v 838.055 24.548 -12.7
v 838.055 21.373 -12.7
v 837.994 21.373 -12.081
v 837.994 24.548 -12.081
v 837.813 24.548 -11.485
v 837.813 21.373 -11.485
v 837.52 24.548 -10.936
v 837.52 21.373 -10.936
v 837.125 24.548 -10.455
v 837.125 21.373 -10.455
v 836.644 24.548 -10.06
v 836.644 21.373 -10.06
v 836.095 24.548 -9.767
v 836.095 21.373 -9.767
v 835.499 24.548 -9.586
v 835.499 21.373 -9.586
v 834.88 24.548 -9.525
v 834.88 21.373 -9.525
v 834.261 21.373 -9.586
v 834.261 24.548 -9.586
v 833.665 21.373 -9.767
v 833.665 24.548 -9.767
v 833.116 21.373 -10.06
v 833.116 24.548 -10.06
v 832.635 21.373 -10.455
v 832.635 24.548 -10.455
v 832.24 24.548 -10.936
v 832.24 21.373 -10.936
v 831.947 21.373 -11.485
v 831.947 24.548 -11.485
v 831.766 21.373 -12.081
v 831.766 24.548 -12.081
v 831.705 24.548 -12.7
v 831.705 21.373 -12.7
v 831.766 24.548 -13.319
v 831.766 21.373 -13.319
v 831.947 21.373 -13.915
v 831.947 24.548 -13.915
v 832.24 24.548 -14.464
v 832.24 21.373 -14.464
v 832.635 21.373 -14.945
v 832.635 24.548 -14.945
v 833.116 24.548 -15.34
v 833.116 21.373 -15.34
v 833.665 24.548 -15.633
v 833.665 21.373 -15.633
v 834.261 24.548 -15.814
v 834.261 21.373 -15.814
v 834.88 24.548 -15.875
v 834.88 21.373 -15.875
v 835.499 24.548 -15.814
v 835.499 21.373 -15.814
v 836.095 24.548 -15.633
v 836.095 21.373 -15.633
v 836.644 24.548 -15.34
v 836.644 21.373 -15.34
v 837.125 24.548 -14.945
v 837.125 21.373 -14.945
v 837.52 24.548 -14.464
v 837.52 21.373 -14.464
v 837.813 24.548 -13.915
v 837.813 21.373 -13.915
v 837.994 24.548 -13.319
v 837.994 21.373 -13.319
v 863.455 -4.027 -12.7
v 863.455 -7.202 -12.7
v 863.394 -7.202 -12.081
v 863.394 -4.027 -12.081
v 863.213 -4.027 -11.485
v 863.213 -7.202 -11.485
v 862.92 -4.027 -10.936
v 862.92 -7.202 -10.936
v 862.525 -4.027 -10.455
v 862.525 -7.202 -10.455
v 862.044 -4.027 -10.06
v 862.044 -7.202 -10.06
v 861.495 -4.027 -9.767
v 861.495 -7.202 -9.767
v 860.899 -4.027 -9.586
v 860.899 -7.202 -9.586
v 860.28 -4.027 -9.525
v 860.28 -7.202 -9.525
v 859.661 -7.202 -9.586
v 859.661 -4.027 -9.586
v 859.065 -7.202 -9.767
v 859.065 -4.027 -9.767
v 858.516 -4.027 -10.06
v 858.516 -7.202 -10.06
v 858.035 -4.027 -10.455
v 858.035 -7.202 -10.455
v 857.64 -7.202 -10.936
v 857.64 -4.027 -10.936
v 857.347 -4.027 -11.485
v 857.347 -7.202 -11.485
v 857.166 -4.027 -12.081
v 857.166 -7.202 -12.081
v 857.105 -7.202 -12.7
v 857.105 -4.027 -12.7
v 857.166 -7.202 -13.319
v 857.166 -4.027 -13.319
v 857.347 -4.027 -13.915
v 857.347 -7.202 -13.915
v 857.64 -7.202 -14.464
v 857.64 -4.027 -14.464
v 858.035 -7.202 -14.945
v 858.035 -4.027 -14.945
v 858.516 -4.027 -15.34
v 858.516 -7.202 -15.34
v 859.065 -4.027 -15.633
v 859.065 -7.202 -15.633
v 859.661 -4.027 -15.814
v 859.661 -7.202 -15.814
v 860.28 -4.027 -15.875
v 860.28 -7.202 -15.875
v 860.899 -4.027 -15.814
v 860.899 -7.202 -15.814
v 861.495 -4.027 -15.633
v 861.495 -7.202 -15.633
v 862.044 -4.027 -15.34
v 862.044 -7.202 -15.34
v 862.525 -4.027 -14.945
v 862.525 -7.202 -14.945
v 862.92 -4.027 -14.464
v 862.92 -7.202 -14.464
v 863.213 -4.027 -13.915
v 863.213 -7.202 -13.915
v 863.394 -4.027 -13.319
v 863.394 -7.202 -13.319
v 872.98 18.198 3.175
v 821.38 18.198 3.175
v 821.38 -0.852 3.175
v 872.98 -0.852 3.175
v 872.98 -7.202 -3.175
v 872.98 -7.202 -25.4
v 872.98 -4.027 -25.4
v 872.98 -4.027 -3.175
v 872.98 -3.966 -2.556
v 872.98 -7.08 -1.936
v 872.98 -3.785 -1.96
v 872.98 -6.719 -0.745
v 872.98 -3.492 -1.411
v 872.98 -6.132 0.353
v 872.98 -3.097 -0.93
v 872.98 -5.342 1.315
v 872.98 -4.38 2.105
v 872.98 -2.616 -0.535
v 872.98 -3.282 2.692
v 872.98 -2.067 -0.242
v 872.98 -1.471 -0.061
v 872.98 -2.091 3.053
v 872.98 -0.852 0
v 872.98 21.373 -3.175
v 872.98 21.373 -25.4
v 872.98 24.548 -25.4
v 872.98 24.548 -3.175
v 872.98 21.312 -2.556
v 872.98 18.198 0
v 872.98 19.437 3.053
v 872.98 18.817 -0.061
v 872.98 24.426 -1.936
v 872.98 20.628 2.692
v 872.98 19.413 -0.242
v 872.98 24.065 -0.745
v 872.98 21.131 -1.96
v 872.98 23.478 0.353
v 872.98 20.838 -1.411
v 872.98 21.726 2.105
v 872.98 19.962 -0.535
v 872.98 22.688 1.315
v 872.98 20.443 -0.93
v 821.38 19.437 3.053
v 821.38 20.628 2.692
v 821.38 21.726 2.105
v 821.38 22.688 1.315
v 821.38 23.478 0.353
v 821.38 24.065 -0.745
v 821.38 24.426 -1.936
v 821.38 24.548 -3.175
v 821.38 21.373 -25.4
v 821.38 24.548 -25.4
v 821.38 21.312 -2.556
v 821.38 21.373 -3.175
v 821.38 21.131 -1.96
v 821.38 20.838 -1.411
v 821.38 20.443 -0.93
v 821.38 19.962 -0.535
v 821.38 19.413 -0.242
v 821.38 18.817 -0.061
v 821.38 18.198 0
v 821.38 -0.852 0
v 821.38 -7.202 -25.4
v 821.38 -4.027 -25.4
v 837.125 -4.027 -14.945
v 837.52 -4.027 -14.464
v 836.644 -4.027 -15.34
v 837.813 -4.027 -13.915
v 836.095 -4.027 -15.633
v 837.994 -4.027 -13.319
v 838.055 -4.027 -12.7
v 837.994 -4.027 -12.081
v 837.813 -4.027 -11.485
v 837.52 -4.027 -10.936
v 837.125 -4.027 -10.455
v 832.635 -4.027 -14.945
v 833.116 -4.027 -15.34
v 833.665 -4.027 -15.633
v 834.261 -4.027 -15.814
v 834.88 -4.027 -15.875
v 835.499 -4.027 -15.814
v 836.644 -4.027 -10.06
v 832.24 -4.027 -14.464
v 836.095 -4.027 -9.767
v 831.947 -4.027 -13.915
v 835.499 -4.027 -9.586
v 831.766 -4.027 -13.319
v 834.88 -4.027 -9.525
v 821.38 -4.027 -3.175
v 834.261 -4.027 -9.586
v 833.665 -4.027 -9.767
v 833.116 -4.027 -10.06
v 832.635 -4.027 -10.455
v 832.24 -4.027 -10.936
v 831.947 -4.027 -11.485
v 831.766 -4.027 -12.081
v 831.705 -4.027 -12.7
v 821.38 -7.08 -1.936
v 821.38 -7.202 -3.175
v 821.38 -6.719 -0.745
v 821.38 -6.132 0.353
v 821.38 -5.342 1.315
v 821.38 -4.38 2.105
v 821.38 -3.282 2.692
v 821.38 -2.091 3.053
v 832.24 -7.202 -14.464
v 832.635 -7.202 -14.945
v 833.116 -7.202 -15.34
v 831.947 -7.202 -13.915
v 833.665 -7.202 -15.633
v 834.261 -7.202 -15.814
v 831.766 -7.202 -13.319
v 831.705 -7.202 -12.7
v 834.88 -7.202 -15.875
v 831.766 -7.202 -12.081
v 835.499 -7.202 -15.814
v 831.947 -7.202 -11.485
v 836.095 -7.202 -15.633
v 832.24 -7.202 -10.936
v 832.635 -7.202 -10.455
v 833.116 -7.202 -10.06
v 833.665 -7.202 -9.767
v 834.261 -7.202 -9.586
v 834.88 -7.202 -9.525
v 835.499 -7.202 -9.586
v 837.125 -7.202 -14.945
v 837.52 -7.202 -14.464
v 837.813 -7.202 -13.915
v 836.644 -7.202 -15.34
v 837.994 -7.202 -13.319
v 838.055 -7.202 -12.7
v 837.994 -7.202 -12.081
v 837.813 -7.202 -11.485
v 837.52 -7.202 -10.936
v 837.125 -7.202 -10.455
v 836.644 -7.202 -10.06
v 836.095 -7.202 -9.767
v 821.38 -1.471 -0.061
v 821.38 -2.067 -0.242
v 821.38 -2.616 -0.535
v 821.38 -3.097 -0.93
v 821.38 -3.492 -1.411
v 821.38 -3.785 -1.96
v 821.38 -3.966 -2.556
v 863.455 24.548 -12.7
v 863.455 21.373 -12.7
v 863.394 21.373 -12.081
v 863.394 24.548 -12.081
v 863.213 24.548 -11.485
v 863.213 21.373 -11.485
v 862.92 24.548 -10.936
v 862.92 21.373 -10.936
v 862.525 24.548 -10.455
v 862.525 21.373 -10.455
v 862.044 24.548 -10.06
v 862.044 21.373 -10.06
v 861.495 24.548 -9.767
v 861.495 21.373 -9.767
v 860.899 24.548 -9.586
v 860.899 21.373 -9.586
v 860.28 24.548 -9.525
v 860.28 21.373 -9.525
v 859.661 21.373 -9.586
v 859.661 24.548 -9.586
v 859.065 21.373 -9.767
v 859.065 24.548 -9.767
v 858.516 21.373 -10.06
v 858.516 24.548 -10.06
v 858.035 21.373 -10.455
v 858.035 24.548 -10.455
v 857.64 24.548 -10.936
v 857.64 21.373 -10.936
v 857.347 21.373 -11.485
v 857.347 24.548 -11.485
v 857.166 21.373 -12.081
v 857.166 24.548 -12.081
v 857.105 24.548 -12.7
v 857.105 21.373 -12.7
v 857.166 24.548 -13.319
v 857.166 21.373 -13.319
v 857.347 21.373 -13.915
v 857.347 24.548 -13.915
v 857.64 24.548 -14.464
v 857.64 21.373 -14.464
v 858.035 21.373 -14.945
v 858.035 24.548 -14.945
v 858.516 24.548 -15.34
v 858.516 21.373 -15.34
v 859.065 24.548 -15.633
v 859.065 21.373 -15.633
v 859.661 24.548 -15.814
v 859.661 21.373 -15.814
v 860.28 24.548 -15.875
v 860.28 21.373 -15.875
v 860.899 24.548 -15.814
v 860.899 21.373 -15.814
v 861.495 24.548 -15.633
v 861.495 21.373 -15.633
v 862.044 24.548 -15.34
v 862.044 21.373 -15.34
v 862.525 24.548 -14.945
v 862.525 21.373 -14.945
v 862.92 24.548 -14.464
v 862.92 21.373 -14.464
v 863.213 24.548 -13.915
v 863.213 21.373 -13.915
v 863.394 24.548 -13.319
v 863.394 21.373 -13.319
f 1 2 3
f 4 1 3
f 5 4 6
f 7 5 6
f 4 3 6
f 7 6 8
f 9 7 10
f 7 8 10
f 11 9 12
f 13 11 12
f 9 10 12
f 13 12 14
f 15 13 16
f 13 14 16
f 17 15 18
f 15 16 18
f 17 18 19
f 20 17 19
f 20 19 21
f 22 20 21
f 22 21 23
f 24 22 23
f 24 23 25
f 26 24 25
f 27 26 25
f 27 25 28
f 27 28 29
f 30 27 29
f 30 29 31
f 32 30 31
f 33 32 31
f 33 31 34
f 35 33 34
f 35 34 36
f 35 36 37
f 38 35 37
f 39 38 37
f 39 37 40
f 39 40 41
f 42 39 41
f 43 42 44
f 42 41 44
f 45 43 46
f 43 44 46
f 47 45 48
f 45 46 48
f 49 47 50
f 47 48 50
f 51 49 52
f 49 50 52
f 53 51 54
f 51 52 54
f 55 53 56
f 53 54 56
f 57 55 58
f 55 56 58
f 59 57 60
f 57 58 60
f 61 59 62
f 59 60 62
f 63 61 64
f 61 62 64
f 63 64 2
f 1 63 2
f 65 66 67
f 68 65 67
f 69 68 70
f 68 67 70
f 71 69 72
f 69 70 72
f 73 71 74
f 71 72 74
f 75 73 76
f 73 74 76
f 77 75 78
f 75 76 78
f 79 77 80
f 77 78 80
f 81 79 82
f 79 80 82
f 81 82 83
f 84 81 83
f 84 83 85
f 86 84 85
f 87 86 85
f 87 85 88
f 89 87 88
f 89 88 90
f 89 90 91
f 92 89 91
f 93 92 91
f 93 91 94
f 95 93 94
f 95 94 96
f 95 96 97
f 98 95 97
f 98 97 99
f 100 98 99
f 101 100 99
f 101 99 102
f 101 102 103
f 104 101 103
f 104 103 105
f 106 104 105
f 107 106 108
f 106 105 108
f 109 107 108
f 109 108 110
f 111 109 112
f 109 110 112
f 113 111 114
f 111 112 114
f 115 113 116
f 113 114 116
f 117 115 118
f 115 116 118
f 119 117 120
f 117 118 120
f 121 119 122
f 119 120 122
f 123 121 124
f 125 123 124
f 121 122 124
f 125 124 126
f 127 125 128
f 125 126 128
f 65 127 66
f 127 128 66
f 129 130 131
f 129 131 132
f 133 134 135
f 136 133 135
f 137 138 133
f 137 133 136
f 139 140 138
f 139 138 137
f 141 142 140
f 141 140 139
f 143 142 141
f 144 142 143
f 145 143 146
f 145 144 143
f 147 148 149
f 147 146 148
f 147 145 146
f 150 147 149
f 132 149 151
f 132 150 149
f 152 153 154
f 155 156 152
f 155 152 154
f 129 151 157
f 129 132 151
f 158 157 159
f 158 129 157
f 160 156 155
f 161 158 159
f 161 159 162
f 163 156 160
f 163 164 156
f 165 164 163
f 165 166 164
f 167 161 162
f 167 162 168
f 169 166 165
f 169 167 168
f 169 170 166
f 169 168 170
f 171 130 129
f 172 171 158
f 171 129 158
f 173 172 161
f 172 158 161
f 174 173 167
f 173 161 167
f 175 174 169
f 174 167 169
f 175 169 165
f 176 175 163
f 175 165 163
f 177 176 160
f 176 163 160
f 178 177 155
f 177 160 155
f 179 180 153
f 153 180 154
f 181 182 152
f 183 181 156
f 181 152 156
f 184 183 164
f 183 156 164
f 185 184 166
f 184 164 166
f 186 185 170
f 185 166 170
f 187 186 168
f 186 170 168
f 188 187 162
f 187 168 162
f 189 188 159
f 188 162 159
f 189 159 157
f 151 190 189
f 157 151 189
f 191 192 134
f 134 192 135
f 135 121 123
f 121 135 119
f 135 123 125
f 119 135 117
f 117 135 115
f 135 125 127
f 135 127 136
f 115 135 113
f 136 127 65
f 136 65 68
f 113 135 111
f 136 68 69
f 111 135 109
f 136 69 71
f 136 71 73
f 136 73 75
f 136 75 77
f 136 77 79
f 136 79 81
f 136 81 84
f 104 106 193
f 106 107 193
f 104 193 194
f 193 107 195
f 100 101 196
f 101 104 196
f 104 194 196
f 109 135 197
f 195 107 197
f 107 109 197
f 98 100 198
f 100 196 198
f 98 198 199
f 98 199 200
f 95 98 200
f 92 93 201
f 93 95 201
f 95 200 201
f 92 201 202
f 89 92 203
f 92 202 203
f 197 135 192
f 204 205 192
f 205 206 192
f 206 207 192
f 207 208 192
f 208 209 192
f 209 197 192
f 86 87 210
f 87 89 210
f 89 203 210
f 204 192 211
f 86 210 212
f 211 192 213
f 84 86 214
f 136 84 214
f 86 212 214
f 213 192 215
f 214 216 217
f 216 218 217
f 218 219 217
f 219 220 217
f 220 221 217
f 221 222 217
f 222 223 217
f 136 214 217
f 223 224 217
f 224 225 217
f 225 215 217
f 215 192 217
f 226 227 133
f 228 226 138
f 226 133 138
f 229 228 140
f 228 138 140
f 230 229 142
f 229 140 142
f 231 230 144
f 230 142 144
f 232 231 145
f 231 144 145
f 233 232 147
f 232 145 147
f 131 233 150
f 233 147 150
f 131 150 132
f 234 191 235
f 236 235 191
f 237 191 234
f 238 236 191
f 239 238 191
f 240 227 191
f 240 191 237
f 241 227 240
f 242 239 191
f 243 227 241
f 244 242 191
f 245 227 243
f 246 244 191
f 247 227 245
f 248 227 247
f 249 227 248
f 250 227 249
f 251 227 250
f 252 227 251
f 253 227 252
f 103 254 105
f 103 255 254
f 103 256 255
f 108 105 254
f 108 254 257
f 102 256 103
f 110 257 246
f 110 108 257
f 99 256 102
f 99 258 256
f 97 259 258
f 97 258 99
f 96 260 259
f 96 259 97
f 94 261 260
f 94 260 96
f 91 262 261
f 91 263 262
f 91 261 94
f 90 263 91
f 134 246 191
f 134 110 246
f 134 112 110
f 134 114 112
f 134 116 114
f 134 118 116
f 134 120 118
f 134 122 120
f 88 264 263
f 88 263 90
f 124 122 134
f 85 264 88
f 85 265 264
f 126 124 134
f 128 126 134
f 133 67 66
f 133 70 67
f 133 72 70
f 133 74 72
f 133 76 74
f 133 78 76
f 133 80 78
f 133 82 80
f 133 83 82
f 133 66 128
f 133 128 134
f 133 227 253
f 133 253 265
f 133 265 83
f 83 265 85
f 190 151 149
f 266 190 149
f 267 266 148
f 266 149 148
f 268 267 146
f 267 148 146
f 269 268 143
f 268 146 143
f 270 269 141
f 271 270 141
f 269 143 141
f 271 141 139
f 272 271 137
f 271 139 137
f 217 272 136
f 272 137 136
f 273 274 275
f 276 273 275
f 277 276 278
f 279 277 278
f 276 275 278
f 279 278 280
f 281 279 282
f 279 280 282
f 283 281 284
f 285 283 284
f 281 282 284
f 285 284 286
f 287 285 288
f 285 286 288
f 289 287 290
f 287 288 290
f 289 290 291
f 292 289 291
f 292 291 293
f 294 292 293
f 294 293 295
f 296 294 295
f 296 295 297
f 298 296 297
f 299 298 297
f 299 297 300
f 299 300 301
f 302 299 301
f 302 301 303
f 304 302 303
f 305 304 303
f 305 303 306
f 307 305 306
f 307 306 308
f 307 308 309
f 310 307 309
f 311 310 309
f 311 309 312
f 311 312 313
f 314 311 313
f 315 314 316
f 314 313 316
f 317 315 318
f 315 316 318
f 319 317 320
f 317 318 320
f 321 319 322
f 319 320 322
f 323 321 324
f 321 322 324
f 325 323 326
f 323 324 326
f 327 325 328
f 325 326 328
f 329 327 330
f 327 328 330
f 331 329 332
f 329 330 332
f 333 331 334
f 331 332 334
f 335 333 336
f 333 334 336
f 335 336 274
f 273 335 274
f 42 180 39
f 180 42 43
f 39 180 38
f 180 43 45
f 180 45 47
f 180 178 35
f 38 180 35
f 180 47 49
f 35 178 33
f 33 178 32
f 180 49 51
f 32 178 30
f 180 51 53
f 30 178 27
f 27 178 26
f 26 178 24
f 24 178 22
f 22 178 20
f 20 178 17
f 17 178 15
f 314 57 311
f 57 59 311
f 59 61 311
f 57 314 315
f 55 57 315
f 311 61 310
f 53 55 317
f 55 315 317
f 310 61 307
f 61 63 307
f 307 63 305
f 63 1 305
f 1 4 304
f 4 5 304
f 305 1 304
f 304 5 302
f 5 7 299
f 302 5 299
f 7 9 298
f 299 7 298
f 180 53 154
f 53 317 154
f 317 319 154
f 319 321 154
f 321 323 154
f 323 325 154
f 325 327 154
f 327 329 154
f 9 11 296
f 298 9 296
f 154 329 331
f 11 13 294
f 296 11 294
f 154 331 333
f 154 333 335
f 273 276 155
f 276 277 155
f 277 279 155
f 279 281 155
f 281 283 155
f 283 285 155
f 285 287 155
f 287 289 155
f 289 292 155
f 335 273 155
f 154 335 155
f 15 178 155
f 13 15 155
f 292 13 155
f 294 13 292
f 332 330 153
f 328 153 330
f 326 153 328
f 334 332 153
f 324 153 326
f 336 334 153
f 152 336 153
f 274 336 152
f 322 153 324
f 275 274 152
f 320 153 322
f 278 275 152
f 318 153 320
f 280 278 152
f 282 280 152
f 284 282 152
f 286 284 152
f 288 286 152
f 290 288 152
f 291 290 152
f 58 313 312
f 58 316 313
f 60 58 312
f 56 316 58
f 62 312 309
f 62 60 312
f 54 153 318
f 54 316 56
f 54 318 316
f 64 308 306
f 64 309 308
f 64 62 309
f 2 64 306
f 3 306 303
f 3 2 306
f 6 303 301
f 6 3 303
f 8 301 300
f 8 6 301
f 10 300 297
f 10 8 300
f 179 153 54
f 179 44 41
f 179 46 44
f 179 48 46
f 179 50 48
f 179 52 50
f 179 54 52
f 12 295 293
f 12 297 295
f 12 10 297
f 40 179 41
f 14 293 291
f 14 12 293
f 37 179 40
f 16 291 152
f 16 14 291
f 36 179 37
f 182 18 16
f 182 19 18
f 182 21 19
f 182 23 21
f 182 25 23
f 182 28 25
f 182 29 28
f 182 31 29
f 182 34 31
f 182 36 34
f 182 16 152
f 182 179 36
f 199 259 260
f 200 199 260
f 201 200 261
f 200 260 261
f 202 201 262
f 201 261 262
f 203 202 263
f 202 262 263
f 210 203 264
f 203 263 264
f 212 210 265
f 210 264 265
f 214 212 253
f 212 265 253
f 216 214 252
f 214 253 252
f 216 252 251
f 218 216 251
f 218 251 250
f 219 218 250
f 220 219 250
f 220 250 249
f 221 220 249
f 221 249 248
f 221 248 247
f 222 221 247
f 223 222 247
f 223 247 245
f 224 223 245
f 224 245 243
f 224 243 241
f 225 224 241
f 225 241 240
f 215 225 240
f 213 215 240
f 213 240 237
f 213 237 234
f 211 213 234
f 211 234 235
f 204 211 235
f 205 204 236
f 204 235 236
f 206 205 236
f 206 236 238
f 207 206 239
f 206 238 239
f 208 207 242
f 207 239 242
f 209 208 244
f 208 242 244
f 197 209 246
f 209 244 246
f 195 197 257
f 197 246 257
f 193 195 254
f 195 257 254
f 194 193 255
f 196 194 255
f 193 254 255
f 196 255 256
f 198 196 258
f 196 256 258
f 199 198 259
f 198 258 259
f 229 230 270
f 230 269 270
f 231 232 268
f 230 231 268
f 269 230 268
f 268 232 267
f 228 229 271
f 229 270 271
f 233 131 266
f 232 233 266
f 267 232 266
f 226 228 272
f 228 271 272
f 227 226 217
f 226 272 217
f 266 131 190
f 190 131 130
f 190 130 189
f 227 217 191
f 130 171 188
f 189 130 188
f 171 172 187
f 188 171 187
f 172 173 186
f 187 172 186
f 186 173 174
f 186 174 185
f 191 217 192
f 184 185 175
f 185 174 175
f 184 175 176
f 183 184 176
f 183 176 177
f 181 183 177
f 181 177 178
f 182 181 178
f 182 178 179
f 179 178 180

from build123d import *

# Parameters (mm, degrees)
SKETCH1_W          = 889
SKETCH1_H          = 31.75
EXTRUDE1_DEPTH     = 28.575
EXTRUDE2_REACH     = 891.702
SKETCH2_W          = 25.4
SKETCH2_H          = 25.4
HOLE1_D            = 6.35
HOLE1_DEPTH        = 3.175
LPATTERN1_COUNT    = 35
LPATTERN1_PITCH    = 25.4
HOLE2_D            = 9.652
LPATTERN2_COUNT    = 12
LPATTERN2_PITCH    = 25.4
HOLE3_D            = 9.652
HOLE4_D            = 9.652
LPATTERN3_COUNT    = 12
LPATTERN3_PITCH    = 25.4
HOLE5_D            = 3.175
HOLE6_D            = 6.35
LPATTERN4_COUNT    = 35
LPATTERN4_PITCH    = 25.4
FILLET1_R          = 3.175
FILLET2_R          = 3.175
FILLET3_R          = 6.35
FILLET4_R          = 6.35
SKETCH16_W         = 145.760071232
SKETCH16_H         = 71.504803879
CUT_EXTRUDE2_DEPTH = 75
SKETCH17_W         = 473.628565651
SKETCH17_H         = 66.908943447
CUT_EXTRUDE3_DEPTH = 186
SKETCH18_W         = 383.094897193
SKETCH18_H         = 93.915816603
CUT_EXTRUDE4_DEPTH = 186
SKETCH19_W         = 44.323760151
SKETCH19_H         = 53.749642994
CUT_EXTRUDE5_DEPTH = 186


with BuildPart() as part:
    # Sketch1 → Extrude1 (new body)
    with BuildSketch(Plane.XY.offset(3.175)):
        with Locations((428.480011997, 8.672957166)):
            Rectangle(SKETCH1_W, SKETCH1_H)
    extrude(amount=-EXTRUDE1_DEPTH)

    # Sketch2 → Extrude2 (cut, up to next)
    with BuildSketch(Plane.ZY.offset(16.019988003), mode=Mode.PRIVATE) as extrude2_sk1:
        with Locations((-12.7, 8.672957166)):
            Rectangle(SKETCH2_W, SKETCH2_H)
    extrude2_tool1 = extrude(extrude2_sk1.sketch, amount=-EXTRUDE2_REACH, mode=Mode.PRIVATE) & part.part
    add(extrude2_tool1.solids().sort_by_distance((-16.019988, 8.672957, -12.7))[0], mode=Mode.SUBTRACT)

    # Hole1
    with Locations(Plane(origin=(0, 24.547957166, 0), x_dir=(-1, 0, 0), z_dir=(0, 1, 0))):
        with Locations((3.319988003, -12.7)):
            hole1 = Hole(HOLE1_D / 2, depth=HOLE1_DEPTH)

    # LPattern1: Hole1 ×35
    with Locations(*[(i * LPATTERN1_PITCH, 0, 0) for i in range(1, LPATTERN1_COUNT)]):
        add(hole1, mode=Mode.SUBTRACT)

    # Hole2 (through all)
    with Locations(Plane.XY.offset(3.175)):
        with Locations((66.530011997, 10.577957166)):
            hole2 = Hole(HOLE2_D / 2)

    # LPattern2: Hole2 ×12, 8 skipped
    with Locations(*[(i * LPATTERN2_PITCH, 0, 0) for i in range(1, LPATTERN2_COUNT) if i not in (2, 3, 4, 5, 6, 7, 8, 9)]):
        add(hole2, mode=Mode.SUBTRACT)

    # Hole3 (through all)
    with Locations(Plane.XY.offset(3.175)):
        with Locations((428.480011997, 6.767957166)):
            Hole(HOLE3_D / 2)

    # Hole4 (through all)
    with Locations(Plane.XY.offset(3.175)):
        with Locations((511.030011997, 10.577957166)):
            hole4 = Hole(HOLE4_D / 2)

    # LPattern3: Hole4 ×12, 8 skipped
    with Locations(*[(i * LPATTERN3_PITCH, 0, 0) for i in range(1, LPATTERN3_COUNT) if i not in (2, 3, 4, 5, 6, 7, 8, 9)]):
        add(hole4, mode=Mode.SUBTRACT)

    # Hole5 (through all)
    with Locations(Plane.XY.offset(3.175)):
        with Locations((669.780011997, 8.672957166)):
            Hole(HOLE5_D / 2)

    # Hole6 (through all)
    with Locations(Plane(origin=(0, -4.027042834, 0), x_dir=(-1, 0, 0), z_dir=(0, 1, 0))):
        with Locations((3.319988003, -12.7)):
            hole6 = Hole(HOLE6_D / 2)

    # LPattern4: Hole6 ×35
    with Locations(*[(i * LPATTERN4_PITCH, 0, 0) for i in range(1, LPATTERN4_COUNT)]):
        add(hole6, mode=Mode.SUBTRACT)

    # Fillet1
    fillet1_edges = [part.edges().sort_by_distance(p)[0] for p in [
        (428.480011997, 21.372957166, 0),
    ]]
    fillet(fillet1_edges, radius=FILLET1_R)

    # Fillet2
    fillet2_edges = [part.edges().sort_by_distance(p)[0] for p in [
        (428.480011997, -4.027042834, 0),
    ]]
    fillet(fillet2_edges, radius=FILLET2_R)

    # Fillet3
    fillet3_edges = [part.edges().sort_by_distance(p)[0] for p in [
        (428.480011997, -7.202042834, 3.175),
    ]]
    fillet(fillet3_edges, radius=FILLET3_R)

    # Fillet4
    fillet4_edges = [part.edges().sort_by_distance(p)[0] for p in [
        (428.480011997, 24.547957166, 3.175),
    ]]
    fillet(fillet4_edges, radius=FILLET4_R)

    # Sketch16 → Cut-Extrude2 (cut)
    with BuildSketch(Plane(origin=(0, 24.547957166, 0), x_dir=(1, 0, 0), z_dir=(0, 1, 0))):
        with Locations((40.099976381, -10.352401939)):
            Rectangle(SKETCH16_W, SKETCH16_H)
    extrude(amount=-CUT_EXTRUDE2_DEPTH, mode=Mode.SUBTRACT)

    # Sketch17 → Cut-Extrude3 (cut)
    with BuildSketch(Plane(origin=(0, 24.547957166, 0), x_dir=(1, 0, 0), z_dir=(0, 1, 0))):
        with Locations((288.165729172, -8.054471723)):
            Rectangle(SKETCH17_W, SKETCH17_H)
    extrude(amount=-CUT_EXTRUDE3_DEPTH, mode=Mode.SUBTRACT)

    # Sketch18 → Cut-Extrude4 (cut)
    with BuildSketch(Plane(origin=(0, 24.547957166, 0), x_dir=(1, 0, 0), z_dir=(0, 1, 0))):
        with Locations((621.432563401, -21.557908301)):
            Rectangle(SKETCH18_W, SKETCH18_H)
    extrude(amount=-CUT_EXTRUDE4_DEPTH, mode=Mode.SUBTRACT)

    # Sketch19 → Cut-Extrude5 (cut)
    with BuildSketch(Plane(origin=(0, 24.547957166, 0), x_dir=(1, 0, 0), z_dir=(0, 1, 0))):
        with Locations((799.218131922, -1.474821497)):
            Rectangle(SKETCH19_W, SKETCH19_H)
    extrude(amount=-CUT_EXTRUDE5_DEPTH, mode=Mode.SUBTRACT)


solid = part.part
